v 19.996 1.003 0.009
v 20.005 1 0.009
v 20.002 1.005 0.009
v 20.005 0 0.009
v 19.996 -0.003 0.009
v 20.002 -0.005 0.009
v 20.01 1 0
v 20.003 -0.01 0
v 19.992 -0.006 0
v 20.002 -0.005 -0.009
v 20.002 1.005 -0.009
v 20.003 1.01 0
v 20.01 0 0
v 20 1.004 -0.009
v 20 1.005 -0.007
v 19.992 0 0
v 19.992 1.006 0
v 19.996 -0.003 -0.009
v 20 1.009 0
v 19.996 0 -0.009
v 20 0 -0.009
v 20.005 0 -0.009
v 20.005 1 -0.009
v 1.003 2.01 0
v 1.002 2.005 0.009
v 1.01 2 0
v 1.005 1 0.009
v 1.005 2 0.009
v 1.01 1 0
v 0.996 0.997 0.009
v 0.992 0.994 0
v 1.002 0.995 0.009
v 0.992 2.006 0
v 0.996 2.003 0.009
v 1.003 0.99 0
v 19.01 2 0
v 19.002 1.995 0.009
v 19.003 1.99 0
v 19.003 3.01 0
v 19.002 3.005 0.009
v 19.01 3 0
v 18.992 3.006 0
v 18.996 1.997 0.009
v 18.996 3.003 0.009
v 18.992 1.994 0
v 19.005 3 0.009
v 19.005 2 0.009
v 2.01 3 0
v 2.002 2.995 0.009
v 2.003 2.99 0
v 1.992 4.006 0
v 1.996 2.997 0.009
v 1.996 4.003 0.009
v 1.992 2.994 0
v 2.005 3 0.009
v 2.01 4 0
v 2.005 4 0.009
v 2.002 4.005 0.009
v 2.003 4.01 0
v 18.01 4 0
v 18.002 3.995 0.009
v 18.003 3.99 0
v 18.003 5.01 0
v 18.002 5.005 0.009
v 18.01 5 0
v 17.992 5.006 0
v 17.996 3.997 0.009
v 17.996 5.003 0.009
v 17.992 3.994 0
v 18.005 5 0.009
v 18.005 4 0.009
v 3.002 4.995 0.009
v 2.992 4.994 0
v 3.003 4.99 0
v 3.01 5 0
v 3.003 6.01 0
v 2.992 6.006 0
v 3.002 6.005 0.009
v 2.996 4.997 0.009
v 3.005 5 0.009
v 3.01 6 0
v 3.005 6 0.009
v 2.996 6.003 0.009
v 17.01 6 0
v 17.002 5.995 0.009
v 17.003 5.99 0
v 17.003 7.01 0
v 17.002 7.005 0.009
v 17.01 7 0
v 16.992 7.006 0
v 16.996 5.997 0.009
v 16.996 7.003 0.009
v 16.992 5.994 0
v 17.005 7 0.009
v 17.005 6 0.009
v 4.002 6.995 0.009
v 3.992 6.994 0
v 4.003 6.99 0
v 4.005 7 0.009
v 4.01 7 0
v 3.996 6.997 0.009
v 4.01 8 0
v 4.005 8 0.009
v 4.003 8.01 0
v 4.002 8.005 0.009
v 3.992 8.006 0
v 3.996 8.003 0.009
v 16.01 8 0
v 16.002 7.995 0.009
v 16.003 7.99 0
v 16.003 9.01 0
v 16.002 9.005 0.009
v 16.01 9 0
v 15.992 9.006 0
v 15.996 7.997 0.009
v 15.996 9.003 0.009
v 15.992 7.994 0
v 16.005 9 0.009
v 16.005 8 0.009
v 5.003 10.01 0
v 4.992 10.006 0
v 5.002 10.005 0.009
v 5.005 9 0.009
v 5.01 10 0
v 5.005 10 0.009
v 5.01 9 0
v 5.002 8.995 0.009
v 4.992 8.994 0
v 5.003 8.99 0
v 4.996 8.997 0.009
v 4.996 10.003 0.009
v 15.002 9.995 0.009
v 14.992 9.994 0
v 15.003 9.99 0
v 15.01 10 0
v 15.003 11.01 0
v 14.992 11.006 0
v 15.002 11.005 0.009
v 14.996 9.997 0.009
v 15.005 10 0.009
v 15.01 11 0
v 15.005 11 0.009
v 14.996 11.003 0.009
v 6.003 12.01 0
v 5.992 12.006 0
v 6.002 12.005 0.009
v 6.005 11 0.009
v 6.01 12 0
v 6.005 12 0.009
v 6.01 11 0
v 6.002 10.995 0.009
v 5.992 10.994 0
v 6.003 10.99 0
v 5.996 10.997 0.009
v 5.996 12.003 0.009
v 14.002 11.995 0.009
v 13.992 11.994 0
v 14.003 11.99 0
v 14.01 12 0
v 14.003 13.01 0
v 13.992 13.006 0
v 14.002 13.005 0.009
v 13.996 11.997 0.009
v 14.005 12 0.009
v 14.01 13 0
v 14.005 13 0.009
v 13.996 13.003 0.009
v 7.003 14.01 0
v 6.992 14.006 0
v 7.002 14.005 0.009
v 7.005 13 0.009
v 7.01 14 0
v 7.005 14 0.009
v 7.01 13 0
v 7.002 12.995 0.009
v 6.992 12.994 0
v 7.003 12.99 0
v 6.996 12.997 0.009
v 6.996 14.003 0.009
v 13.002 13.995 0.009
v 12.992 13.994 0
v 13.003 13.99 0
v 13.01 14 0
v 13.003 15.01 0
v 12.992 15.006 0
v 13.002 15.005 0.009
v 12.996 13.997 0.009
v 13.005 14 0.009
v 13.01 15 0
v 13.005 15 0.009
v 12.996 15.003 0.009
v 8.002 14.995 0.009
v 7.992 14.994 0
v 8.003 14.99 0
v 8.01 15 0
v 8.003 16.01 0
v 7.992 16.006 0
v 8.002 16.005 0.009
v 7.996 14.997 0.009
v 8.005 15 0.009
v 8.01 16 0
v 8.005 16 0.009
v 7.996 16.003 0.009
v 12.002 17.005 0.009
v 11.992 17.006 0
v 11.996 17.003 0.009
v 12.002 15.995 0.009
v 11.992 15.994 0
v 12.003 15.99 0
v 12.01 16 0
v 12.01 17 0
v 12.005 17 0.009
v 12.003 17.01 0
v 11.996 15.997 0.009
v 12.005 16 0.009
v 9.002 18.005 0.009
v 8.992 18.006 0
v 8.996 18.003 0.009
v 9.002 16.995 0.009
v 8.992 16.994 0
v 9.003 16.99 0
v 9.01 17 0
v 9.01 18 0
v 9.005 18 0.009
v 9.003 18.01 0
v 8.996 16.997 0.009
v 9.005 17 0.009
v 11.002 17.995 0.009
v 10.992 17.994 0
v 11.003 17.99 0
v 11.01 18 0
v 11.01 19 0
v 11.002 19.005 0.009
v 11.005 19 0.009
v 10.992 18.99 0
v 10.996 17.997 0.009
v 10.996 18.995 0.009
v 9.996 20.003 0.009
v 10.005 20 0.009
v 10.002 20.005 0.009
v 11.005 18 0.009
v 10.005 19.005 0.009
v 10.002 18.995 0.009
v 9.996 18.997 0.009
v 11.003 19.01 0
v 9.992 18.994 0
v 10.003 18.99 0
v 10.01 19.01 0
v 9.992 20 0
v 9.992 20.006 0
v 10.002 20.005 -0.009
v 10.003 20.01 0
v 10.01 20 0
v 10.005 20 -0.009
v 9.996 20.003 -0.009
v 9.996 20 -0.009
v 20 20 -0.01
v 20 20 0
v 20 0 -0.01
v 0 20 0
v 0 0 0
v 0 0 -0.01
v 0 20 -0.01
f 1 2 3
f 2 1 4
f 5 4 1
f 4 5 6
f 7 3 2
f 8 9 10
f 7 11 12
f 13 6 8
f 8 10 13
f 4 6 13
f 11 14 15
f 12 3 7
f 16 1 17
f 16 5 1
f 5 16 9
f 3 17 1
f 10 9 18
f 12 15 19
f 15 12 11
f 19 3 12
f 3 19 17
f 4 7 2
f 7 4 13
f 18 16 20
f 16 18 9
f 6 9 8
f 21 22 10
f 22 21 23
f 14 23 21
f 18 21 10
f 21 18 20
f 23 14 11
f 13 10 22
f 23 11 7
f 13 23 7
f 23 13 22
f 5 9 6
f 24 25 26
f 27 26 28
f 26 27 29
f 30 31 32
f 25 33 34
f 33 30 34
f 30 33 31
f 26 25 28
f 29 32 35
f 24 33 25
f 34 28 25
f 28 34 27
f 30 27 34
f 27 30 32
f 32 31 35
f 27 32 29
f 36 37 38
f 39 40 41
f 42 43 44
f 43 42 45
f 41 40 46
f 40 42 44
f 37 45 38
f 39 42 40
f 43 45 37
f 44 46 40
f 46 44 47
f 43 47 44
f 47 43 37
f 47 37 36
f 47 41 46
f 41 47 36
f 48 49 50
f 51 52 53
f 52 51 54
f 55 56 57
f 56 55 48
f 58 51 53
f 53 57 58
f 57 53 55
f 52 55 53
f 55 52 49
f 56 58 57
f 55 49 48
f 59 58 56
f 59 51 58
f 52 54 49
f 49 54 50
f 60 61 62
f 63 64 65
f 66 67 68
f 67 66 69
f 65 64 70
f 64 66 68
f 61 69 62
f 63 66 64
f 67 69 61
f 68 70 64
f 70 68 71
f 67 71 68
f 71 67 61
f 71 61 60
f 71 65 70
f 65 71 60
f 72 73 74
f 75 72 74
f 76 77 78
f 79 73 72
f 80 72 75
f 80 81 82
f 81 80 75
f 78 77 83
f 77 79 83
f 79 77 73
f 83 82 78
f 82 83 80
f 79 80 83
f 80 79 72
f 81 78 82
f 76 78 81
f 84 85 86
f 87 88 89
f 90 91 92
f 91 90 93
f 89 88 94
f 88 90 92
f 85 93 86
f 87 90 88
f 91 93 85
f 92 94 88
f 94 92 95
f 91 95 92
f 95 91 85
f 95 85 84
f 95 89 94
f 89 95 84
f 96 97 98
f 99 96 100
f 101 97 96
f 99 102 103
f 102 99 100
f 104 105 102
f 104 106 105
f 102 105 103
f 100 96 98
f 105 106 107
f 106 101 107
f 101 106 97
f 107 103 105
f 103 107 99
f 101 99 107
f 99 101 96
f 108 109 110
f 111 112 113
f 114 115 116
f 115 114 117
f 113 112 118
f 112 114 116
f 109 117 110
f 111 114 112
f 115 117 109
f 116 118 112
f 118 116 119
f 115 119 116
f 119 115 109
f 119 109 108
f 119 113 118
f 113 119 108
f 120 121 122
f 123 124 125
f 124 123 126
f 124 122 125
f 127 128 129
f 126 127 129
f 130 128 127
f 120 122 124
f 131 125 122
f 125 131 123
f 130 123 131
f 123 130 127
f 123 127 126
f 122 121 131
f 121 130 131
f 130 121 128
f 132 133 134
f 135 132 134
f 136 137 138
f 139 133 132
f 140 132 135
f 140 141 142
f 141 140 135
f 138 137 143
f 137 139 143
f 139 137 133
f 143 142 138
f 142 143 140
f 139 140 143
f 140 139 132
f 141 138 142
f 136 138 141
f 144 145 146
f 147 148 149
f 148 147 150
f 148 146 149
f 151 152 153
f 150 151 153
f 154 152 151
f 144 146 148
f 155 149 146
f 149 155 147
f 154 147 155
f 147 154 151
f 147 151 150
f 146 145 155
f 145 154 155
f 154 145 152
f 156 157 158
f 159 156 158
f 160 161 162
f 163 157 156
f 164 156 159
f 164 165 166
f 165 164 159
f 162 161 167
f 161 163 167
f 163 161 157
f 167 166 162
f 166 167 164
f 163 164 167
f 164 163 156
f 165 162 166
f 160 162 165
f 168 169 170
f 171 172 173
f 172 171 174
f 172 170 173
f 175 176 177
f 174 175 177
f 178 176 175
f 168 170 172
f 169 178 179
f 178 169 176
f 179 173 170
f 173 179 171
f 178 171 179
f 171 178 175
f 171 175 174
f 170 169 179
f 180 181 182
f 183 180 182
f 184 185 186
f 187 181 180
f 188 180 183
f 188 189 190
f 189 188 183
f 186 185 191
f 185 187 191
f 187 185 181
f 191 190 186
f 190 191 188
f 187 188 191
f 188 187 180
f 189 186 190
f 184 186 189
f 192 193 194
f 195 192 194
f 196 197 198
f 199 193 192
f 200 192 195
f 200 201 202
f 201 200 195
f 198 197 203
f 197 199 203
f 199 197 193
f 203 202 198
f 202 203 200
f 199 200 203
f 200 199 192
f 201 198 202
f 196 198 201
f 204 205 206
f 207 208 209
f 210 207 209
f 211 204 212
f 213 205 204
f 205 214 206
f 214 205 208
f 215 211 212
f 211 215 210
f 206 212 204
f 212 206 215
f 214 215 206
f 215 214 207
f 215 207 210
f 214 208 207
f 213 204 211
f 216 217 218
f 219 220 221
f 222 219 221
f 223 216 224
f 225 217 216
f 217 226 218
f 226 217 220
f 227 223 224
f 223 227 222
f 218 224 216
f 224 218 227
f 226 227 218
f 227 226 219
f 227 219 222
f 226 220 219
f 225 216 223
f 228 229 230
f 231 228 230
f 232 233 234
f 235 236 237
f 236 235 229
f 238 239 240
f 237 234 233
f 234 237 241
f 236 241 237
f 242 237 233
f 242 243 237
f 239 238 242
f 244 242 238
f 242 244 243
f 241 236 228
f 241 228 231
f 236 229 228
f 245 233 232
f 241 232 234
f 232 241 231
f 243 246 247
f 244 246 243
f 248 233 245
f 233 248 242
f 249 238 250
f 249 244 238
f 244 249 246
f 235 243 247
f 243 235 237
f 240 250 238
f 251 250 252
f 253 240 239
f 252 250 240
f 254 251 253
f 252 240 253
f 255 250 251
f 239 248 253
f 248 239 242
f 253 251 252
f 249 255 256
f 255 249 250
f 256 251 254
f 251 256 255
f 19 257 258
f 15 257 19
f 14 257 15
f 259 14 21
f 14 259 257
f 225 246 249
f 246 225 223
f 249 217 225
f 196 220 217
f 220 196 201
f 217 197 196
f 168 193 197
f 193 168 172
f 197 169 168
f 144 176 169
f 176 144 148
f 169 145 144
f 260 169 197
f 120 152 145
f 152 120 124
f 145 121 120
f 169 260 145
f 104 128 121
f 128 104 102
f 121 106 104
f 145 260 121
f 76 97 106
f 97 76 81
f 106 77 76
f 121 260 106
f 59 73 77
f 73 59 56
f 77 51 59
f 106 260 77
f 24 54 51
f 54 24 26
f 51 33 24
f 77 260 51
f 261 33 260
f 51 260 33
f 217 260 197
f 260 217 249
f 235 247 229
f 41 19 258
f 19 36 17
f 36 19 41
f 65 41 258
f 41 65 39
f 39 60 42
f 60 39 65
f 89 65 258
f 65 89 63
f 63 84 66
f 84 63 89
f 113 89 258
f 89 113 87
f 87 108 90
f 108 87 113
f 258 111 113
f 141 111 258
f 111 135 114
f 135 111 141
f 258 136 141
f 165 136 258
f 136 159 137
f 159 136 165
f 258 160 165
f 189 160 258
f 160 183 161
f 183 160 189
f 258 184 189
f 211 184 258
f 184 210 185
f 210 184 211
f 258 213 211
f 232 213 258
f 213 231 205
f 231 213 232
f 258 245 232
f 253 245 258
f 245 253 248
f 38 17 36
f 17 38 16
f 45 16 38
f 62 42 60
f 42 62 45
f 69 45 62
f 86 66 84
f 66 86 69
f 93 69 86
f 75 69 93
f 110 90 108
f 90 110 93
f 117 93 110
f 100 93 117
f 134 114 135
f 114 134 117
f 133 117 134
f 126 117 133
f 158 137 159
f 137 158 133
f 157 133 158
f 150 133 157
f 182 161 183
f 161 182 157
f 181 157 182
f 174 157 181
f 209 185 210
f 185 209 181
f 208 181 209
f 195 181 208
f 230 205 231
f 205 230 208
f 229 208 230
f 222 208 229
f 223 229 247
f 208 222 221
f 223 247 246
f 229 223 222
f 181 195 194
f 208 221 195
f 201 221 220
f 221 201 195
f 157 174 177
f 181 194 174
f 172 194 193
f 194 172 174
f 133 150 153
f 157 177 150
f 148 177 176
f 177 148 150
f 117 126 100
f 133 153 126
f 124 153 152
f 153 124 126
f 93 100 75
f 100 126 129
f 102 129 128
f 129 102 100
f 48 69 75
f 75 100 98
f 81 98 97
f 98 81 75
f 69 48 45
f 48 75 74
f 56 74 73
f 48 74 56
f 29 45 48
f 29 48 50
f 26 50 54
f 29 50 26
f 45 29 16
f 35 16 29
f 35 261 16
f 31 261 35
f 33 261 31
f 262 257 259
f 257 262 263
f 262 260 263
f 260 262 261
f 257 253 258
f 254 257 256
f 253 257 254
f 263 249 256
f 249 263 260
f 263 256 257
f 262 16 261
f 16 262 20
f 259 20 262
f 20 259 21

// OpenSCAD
hull(){
    translate([20, 0]) sphere(0.01);
    translate([20, 1]) sphere(0.01);
}
hull(){
    translate([1, 1]) sphere(0.01);
    translate([1, 2]) sphere(0.01);
}
hull(){
    translate([19, 2]) sphere(0.01);
    translate([19, 3]) sphere(0.01);
}
hull(){
    translate([2, 3]) sphere(0.01);
    translate([2, 4]) sphere(0.01);
}
hull(){
    translate([18, 4]) sphere(0.01);
    translate([18, 5]) sphere(0.01);
}
hull(){
    translate([3, 5]) sphere(0.01);
    translate([3, 6]) sphere(0.01);
}
hull(){
    translate([17, 6]) sphere(0.01);
    translate([17, 7]) sphere(0.01);
}
hull(){
    translate([4, 7]) sphere(0.01);
    translate([4, 8]) sphere(0.01);
}
hull(){
    translate([16, 8]) sphere(0.01);
    translate([16, 9]) sphere(0.01);
}
hull(){
    translate([5, 9]) sphere(0.01);
    translate([5, 10]) sphere(0.01);
}
hull(){
    translate([15, 10]) sphere(0.01);
    translate([15, 11]) sphere(0.01);
}
hull(){
    translate([6, 11]) sphere(0.01);
    translate([6, 12]) sphere(0.01);
}
hull(){
    translate([14, 12]) sphere(0.01);
    translate([14, 13]) sphere(0.01);
}
hull(){
    translate([7, 13]) sphere(0.01);
    translate([7, 14]) sphere(0.01);
}
hull(){
    translate([13, 14]) sphere(0.01);
    translate([13, 15]) sphere(0.01);
}
hull(){
    translate([8, 15]) sphere(0.01);
    translate([8, 16]) sphere(0.01);
}
hull(){
    translate([12, 16]) sphere(0.01);
    translate([12, 17]) sphere(0.01);
}
hull(){
    translate([9, 17]) sphere(0.01);
    translate([9, 18]) sphere(0.01);
}
hull(){
    translate([11, 18]) sphere(0.01);
    translate([11, 19]) sphere(0.01);
}
hull(){
    translate([11, 19]) sphere(0.01);
    translate([10, 19]) sphere(0.01);
}
hull(){
    translate([10, 19]) sphere(0.01);
    translate([10, 20]) sphere(0.01);
}
translate([0,0,-0.01]) color([0.1,0.1,0.1]) cube([20,20,0.01]);
